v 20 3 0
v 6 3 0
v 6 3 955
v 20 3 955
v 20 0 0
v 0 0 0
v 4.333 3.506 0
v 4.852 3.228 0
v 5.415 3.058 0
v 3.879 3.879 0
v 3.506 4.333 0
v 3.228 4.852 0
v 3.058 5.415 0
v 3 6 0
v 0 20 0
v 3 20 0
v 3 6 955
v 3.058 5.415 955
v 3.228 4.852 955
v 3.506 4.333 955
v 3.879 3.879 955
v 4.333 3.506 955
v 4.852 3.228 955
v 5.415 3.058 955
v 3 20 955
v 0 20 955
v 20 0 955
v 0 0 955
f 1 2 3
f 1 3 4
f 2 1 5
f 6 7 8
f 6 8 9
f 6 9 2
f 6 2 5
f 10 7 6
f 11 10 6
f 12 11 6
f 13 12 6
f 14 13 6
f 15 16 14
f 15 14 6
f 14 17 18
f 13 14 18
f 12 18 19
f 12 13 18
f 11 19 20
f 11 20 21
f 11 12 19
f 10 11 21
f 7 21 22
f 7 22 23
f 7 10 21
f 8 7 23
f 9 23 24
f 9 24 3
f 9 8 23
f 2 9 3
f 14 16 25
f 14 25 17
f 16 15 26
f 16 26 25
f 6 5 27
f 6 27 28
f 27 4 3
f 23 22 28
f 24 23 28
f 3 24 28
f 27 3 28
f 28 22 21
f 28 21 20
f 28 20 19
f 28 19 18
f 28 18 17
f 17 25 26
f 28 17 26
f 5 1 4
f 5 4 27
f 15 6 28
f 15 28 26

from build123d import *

# Parameters (mm, degrees)
BOSS_EXTRU_1_DEPTH = 955


with BuildPart() as part:
    # Esquisse1 → Boss.-Extru.1 (new body)
    with BuildSketch(Plane.XY):
        with BuildLine():
            Line((0, 0), (0, 20))
            Line((0, 20), (3, 20))
            Line((3, 20), (3, 6))
            ThreePointArc((3, 6), (3.878679656, 3.878679656), (6, 3))
            Line((6, 3), (20, 3))
            Line((20, 3), (20, 0))
            Line((20, 0), (0, 0))
        make_face()
    extrude(amount=BOSS_EXTRU_1_DEPTH)


solid = part.part
